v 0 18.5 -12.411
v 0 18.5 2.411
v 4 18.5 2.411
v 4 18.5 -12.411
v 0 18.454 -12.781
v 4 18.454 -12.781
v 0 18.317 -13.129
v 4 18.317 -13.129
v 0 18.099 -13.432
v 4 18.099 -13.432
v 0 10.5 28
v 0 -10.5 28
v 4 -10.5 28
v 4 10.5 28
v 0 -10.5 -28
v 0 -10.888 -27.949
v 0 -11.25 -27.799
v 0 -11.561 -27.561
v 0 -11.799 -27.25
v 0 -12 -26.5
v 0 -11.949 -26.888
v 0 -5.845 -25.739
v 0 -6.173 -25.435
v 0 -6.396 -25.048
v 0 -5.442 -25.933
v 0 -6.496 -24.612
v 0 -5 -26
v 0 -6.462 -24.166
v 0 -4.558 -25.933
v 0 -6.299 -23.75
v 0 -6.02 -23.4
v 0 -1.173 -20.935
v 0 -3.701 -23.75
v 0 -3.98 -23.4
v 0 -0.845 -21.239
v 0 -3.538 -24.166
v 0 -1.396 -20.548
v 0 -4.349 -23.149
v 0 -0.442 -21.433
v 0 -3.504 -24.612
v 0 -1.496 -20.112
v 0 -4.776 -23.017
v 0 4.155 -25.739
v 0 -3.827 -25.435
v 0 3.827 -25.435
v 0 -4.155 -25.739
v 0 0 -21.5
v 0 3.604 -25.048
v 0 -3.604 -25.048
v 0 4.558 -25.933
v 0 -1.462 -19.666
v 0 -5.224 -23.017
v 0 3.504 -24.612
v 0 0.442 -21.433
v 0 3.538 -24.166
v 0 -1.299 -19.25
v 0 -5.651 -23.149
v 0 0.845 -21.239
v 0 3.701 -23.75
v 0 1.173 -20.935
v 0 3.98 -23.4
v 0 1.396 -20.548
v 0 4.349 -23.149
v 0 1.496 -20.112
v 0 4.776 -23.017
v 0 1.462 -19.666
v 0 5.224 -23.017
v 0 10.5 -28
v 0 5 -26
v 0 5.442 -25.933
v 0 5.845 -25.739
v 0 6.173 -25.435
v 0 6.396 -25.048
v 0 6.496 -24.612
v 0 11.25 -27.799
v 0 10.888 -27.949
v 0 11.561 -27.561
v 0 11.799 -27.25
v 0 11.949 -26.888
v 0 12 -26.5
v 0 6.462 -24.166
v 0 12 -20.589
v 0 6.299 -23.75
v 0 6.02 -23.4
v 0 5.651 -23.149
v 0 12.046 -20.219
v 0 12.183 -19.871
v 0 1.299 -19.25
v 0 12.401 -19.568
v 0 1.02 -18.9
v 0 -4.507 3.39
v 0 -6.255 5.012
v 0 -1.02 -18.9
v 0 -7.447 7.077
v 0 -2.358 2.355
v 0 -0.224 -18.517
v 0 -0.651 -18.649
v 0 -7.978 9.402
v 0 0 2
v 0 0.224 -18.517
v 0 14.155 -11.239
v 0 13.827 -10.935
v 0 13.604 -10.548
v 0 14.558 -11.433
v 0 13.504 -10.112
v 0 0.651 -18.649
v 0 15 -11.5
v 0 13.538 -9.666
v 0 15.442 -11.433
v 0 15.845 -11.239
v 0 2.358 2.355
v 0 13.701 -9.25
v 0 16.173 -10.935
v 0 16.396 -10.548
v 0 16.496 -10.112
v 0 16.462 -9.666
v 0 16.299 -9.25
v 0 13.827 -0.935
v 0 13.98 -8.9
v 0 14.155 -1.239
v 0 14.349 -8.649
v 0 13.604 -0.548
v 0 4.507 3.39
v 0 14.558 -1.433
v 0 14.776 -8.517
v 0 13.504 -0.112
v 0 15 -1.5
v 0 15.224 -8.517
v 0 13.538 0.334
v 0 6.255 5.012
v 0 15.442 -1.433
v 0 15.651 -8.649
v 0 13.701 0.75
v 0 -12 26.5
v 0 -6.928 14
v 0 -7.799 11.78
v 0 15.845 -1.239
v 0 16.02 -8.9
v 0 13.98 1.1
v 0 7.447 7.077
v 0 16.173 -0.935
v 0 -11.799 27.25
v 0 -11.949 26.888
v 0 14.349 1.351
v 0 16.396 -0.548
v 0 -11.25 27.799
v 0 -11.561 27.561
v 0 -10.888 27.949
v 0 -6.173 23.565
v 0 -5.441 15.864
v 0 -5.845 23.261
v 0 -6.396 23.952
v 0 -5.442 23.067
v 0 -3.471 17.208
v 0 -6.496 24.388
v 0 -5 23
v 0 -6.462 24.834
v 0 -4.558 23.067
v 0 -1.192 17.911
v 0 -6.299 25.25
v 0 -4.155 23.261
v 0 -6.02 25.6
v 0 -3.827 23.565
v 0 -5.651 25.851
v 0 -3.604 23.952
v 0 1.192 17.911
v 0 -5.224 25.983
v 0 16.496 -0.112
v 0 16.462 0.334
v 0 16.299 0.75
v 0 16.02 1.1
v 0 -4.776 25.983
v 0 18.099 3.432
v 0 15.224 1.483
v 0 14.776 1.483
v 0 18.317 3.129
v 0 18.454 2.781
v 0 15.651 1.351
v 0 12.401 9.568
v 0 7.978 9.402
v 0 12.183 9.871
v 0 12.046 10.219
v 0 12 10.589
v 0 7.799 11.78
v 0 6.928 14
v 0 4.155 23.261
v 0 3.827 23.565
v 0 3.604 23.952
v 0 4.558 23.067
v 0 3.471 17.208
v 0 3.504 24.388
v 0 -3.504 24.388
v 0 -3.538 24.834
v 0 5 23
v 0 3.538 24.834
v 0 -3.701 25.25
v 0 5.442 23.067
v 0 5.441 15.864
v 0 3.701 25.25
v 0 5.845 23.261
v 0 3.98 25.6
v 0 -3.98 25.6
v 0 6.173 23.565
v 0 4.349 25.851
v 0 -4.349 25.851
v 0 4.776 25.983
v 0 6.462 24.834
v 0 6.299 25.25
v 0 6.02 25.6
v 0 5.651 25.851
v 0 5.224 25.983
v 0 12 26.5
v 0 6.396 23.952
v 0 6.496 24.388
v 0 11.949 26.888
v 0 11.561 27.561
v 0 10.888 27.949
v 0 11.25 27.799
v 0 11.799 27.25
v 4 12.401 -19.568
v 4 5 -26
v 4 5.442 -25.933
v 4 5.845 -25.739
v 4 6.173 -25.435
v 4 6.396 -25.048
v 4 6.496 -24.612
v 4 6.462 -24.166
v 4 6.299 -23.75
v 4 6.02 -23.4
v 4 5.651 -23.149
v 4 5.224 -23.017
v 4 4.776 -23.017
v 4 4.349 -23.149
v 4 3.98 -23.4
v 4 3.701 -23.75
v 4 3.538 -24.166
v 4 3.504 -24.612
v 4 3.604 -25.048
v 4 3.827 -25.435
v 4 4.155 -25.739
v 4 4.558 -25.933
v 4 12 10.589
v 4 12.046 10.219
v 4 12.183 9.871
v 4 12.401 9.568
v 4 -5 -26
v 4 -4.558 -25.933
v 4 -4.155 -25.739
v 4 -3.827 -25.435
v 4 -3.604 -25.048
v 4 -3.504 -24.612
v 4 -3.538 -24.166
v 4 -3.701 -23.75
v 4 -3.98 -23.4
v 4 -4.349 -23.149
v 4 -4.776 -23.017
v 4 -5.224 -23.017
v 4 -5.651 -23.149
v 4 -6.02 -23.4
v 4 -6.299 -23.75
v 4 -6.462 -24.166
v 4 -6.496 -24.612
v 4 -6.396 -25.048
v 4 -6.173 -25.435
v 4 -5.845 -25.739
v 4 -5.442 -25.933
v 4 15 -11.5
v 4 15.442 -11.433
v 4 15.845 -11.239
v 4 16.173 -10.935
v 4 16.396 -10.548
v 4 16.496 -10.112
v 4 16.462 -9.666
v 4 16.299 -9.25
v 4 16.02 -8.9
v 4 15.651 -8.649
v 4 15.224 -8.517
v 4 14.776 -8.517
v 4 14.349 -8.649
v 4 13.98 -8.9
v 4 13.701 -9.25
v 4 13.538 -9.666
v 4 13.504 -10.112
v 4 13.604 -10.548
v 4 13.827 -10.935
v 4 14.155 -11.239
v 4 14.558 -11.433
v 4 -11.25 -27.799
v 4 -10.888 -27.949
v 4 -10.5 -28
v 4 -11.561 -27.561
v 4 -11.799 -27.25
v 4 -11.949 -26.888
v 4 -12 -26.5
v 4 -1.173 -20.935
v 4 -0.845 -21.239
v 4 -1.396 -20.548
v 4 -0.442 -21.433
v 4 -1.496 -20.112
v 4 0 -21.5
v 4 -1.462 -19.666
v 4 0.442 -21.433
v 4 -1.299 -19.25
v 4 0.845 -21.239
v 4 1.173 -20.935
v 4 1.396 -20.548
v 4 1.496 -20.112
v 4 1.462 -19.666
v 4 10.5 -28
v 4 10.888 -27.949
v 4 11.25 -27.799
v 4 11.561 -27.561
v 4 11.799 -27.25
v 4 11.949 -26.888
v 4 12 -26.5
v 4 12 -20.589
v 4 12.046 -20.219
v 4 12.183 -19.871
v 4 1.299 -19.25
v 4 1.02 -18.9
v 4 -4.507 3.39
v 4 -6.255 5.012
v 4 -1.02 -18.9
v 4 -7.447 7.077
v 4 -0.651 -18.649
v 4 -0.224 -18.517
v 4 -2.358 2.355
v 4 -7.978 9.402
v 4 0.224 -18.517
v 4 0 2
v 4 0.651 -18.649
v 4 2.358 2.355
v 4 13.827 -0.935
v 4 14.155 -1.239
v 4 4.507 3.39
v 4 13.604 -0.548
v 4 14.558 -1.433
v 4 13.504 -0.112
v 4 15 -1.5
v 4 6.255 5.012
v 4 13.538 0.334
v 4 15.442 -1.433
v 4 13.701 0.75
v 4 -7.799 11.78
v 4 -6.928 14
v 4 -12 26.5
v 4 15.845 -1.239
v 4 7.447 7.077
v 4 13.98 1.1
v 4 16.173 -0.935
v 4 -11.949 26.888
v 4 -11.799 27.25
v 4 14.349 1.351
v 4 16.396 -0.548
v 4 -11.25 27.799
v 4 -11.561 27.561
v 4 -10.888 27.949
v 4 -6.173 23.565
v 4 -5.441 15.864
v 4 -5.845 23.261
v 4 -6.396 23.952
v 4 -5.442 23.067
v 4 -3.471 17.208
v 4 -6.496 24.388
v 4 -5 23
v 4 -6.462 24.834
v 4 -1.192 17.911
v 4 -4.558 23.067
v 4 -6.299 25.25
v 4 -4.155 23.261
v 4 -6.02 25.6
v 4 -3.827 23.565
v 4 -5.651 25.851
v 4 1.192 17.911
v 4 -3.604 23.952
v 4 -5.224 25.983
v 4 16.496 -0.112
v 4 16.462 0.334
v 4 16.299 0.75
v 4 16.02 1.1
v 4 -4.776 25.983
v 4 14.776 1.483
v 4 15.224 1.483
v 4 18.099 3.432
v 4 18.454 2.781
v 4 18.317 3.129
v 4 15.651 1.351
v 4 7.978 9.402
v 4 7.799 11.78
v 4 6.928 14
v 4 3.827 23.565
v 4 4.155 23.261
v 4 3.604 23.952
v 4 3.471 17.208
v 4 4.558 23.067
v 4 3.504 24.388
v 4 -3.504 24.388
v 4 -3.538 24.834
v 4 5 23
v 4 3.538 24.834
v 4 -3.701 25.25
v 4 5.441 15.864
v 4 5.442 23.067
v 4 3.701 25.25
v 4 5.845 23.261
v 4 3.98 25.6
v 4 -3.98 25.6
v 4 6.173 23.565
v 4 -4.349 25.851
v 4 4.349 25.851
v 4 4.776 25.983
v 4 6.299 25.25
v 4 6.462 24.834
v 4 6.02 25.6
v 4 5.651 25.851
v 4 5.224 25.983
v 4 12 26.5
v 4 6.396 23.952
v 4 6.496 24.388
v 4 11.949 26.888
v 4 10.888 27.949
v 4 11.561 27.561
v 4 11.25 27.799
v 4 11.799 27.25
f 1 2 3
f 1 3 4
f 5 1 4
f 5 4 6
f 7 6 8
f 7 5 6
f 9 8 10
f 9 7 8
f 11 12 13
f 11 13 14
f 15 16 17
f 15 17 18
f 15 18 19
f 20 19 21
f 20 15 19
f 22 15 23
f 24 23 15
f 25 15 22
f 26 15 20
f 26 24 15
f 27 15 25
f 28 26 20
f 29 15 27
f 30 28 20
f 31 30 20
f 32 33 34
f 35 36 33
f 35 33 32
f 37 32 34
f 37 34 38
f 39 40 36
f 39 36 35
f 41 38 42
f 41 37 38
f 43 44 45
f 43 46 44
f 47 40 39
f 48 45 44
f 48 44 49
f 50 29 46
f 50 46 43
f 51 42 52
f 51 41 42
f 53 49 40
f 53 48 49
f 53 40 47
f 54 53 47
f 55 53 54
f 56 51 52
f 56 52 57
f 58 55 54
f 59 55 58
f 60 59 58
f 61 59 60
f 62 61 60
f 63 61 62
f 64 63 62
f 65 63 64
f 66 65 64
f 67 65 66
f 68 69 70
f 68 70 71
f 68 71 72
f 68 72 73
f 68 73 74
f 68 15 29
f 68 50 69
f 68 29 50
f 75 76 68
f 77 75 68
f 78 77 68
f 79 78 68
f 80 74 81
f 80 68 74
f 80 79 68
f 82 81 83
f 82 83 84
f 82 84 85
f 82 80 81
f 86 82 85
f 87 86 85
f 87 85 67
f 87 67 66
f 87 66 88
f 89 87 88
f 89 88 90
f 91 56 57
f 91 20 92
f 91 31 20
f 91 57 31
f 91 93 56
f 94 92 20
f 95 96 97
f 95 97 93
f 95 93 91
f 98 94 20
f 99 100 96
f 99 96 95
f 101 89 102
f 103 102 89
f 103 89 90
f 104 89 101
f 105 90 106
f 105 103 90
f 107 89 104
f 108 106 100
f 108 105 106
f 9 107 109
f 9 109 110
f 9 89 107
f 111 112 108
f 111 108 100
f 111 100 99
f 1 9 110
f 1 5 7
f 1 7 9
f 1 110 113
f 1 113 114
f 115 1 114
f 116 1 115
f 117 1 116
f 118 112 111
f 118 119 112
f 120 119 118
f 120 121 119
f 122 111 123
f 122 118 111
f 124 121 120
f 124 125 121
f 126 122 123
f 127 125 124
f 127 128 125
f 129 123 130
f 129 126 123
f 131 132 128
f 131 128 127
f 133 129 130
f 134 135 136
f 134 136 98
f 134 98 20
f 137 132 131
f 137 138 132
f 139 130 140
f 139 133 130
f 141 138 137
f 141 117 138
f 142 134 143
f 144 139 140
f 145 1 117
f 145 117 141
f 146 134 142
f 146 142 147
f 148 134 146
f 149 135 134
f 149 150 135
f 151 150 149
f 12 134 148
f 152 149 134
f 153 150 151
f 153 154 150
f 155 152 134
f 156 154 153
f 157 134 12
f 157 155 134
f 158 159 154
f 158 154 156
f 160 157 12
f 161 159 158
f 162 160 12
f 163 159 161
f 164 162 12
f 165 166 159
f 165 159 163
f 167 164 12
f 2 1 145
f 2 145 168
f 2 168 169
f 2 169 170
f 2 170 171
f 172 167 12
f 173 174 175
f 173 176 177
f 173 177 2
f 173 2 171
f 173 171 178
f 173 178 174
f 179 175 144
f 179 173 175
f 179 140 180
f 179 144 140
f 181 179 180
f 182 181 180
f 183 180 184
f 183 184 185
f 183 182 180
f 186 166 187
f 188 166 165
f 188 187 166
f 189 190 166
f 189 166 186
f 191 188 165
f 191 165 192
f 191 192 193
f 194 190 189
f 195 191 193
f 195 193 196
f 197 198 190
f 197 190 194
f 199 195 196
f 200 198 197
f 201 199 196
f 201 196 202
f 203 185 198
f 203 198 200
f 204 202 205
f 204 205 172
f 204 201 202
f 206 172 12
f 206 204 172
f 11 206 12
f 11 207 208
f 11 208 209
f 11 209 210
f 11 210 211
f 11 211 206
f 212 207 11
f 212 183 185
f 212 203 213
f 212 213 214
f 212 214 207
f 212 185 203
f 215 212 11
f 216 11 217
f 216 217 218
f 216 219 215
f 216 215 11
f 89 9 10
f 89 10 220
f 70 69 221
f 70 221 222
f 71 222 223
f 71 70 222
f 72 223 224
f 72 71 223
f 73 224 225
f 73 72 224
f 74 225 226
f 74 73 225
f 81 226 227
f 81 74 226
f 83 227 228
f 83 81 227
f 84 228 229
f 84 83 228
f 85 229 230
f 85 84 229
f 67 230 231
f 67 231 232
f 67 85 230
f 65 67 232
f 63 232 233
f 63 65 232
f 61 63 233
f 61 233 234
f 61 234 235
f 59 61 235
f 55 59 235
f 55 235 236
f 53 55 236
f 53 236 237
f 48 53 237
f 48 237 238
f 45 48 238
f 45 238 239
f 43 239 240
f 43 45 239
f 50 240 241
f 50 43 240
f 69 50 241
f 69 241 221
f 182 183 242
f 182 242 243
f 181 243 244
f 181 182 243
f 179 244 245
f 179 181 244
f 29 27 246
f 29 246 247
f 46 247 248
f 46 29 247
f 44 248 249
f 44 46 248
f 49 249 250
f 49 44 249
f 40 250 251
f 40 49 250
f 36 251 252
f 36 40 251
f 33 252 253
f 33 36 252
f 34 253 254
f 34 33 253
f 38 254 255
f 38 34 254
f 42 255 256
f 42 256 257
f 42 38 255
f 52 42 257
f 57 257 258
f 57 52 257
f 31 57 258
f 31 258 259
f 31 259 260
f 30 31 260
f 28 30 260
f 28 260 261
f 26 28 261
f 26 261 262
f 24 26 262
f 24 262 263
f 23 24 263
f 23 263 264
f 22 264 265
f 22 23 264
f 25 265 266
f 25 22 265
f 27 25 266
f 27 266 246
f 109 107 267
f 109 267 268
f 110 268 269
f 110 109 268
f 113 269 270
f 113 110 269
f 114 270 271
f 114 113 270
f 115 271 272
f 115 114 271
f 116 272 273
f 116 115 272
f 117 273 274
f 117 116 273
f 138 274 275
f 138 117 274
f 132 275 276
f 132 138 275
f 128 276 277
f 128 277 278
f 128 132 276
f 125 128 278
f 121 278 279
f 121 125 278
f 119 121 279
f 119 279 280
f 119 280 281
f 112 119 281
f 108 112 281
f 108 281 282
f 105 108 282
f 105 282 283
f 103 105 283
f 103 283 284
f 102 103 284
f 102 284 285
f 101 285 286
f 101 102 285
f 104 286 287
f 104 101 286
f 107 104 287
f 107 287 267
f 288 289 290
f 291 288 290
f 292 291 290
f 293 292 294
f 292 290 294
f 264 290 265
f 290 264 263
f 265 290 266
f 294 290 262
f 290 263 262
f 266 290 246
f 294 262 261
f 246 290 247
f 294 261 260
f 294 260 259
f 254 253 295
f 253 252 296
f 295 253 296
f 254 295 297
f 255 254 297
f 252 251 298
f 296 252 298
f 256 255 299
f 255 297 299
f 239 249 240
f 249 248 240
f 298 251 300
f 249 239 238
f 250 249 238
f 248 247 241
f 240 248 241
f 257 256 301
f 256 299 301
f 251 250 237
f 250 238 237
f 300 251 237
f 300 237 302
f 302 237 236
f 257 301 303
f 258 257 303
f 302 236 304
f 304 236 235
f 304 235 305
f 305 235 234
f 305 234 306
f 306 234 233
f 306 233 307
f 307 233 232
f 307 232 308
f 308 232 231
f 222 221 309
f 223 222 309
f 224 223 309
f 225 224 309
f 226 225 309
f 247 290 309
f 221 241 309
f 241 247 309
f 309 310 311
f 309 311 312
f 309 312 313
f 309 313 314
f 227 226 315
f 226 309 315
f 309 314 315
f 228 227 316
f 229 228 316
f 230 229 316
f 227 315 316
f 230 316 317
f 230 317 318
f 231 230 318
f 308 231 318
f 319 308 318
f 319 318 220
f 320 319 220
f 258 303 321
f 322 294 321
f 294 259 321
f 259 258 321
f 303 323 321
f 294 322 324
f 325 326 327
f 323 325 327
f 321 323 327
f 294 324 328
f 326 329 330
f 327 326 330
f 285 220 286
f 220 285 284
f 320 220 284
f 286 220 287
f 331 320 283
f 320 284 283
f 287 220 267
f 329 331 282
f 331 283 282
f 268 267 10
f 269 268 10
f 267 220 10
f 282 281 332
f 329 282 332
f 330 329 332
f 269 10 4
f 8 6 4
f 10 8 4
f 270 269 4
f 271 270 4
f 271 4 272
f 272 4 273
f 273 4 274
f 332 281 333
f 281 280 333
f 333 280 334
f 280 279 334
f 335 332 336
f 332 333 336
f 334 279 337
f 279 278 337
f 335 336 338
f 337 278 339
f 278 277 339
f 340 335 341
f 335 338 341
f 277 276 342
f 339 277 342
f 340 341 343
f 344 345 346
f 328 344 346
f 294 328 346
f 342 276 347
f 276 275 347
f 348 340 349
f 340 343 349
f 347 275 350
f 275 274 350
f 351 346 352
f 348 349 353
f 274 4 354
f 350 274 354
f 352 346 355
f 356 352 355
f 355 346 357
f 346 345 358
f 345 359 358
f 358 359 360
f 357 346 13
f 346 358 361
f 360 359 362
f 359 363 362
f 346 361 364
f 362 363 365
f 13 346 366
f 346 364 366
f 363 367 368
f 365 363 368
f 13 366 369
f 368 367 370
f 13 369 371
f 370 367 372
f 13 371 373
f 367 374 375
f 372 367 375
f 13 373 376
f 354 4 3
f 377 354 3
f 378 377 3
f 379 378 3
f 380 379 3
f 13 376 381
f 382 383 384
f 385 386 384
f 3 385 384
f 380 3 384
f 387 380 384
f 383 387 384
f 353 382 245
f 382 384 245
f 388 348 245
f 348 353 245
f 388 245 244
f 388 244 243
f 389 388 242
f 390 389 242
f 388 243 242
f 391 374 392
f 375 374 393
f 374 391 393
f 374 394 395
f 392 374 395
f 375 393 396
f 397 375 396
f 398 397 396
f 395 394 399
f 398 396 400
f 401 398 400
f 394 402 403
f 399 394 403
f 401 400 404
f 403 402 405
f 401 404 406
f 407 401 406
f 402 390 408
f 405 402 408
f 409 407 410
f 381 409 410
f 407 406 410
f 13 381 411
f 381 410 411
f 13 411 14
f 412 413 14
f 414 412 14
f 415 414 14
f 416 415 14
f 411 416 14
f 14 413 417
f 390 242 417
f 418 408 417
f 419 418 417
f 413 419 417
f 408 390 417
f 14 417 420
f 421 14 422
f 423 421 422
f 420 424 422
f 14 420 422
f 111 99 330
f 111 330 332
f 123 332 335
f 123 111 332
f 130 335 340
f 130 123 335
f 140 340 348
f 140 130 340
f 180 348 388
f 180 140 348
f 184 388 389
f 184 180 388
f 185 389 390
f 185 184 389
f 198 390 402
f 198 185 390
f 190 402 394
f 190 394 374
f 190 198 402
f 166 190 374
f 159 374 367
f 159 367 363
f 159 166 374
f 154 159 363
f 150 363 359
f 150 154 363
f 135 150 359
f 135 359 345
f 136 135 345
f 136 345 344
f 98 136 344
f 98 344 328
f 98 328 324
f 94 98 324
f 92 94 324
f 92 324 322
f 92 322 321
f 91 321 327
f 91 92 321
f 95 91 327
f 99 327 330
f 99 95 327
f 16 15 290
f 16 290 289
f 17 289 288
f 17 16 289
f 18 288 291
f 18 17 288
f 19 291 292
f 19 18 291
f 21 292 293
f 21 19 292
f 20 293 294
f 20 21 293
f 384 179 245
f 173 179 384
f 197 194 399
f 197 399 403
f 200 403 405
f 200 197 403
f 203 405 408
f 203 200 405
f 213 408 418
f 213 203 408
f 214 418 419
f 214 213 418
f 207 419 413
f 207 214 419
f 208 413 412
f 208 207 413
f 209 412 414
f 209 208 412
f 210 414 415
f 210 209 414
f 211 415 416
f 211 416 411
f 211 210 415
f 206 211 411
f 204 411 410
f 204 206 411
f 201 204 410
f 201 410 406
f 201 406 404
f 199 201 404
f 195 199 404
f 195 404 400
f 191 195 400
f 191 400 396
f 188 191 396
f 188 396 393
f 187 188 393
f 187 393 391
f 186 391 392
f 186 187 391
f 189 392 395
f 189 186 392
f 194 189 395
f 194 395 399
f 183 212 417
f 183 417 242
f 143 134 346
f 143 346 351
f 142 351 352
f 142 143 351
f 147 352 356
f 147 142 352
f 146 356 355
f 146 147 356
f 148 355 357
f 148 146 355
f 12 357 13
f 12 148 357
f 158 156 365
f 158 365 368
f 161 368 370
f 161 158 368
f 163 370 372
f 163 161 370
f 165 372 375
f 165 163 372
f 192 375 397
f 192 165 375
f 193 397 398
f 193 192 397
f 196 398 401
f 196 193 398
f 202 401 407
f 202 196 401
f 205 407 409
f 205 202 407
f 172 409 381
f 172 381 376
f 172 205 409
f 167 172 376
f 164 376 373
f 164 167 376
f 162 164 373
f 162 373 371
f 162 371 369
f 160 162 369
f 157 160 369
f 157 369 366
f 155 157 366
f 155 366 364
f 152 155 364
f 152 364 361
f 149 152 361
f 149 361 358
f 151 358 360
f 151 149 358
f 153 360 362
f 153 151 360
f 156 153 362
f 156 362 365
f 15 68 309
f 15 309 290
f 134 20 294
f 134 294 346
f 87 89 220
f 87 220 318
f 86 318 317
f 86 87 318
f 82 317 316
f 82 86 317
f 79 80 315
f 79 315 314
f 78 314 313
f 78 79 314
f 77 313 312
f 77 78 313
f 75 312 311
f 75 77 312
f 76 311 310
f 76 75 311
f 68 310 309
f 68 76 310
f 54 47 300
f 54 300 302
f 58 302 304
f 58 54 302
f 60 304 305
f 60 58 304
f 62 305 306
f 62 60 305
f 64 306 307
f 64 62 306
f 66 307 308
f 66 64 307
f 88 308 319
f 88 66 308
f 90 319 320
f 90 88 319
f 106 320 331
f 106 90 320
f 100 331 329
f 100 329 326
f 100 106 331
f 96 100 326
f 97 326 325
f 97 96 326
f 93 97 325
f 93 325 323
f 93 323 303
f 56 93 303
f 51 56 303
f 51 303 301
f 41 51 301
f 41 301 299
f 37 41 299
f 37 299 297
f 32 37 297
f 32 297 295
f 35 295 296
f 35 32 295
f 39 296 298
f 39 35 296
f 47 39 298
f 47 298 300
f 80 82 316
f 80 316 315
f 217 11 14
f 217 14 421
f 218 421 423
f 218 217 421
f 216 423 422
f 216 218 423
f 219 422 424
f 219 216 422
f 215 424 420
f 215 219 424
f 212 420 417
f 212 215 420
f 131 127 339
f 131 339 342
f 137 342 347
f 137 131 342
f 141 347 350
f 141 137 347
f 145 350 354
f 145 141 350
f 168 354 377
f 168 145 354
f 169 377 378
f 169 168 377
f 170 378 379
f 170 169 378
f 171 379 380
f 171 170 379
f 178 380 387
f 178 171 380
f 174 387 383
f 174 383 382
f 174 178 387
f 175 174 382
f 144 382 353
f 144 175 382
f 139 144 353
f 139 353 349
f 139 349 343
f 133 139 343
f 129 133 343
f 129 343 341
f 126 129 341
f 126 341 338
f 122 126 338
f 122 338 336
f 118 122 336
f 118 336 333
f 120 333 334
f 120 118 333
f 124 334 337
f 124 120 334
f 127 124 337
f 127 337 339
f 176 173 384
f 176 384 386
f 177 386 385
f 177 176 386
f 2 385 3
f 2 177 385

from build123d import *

# Parameters (mm, degrees)
SKETCH_1_R      = 1.5
SKETCH_1_R_2    = 8
EXTRUDE_1_DEPTH = 4


with BuildPart() as part:
    # 草图1 → 凸台-拉伸1 (new body)
    with BuildSketch(Plane(origin=(0, 0, 0), x_dir=(0, 0, -1), z_dir=(1, 0, 0))):
        with BuildLine():
            Line((20.589035366, 12), (26.5, 12))
            ThreePointArc((26.5, 12), (27.560660172, 11.560660172), (28, 10.5))
            Line((28, 10.5), (28, -10.5))
            ThreePointArc((28, -10.5), (27.560660172, -11.560660172), (26.5, -12))
            Line((26.5, -12), (-26.5, -12))
            ThreePointArc((-26.5, -12), (-27.560660172, -11.560660172), (-28, -10.5))
            Line((-28, -10.5), (-28, 10.5))
            ThreePointArc((-28, 10.5), (-27.560660172, 11.560660172), (-26.5, 12))
            Line((-26.5, 12), (-10.589035366, 12))
            ThreePointArc((-10.589035366, 12), (-10.040758683, 12.103793469), (-9.568358717, 12.400809763))
            Line((-9.568358717, 12.400809763), (-3.431641283, 18.099190237))
            ThreePointArc((-3.431641283, 18.099190237), (-2.959241317, 18.396206531), (-2.410964634, 18.5))
            Line((-2.410964634, 18.5), (12.410964634, 18.5))
            ThreePointArc((12.410964634, 18.5), (12.959241317, 18.396206531), (13.431641283, 18.099190237))
            Line((13.431641283, 18.099190237), (19.568358717, 12.400809763))
            ThreePointArc((19.568358717, 12.400809763), (20.040758683, 12.103793469), (20.589035366, 12))
        make_face()
        with Locations((0, 15)):
            Circle(SKETCH_1_R, mode=Mode.SUBTRACT)
        with Locations((20, 0)):
            Circle(SKETCH_1_R, mode=Mode.SUBTRACT)
        with Locations((-10, 0)):
            Circle(SKETCH_1_R_2, mode=Mode.SUBTRACT)
        with Locations((24.5, 5)):
            Circle(SKETCH_1_R, mode=Mode.SUBTRACT)
        with Locations((24.5, -5)):
            Circle(SKETCH_1_R, mode=Mode.SUBTRACT)
        with Locations((-24.5, 5)):
            Circle(SKETCH_1_R, mode=Mode.SUBTRACT)
        with Locations((-24.5, -5)):
            Circle(SKETCH_1_R, mode=Mode.SUBTRACT)
        with Locations((10, 15)):
            Circle(SKETCH_1_R, mode=Mode.SUBTRACT)
    extrude(amount=EXTRUDE_1_DEPTH)


solid = part.part
